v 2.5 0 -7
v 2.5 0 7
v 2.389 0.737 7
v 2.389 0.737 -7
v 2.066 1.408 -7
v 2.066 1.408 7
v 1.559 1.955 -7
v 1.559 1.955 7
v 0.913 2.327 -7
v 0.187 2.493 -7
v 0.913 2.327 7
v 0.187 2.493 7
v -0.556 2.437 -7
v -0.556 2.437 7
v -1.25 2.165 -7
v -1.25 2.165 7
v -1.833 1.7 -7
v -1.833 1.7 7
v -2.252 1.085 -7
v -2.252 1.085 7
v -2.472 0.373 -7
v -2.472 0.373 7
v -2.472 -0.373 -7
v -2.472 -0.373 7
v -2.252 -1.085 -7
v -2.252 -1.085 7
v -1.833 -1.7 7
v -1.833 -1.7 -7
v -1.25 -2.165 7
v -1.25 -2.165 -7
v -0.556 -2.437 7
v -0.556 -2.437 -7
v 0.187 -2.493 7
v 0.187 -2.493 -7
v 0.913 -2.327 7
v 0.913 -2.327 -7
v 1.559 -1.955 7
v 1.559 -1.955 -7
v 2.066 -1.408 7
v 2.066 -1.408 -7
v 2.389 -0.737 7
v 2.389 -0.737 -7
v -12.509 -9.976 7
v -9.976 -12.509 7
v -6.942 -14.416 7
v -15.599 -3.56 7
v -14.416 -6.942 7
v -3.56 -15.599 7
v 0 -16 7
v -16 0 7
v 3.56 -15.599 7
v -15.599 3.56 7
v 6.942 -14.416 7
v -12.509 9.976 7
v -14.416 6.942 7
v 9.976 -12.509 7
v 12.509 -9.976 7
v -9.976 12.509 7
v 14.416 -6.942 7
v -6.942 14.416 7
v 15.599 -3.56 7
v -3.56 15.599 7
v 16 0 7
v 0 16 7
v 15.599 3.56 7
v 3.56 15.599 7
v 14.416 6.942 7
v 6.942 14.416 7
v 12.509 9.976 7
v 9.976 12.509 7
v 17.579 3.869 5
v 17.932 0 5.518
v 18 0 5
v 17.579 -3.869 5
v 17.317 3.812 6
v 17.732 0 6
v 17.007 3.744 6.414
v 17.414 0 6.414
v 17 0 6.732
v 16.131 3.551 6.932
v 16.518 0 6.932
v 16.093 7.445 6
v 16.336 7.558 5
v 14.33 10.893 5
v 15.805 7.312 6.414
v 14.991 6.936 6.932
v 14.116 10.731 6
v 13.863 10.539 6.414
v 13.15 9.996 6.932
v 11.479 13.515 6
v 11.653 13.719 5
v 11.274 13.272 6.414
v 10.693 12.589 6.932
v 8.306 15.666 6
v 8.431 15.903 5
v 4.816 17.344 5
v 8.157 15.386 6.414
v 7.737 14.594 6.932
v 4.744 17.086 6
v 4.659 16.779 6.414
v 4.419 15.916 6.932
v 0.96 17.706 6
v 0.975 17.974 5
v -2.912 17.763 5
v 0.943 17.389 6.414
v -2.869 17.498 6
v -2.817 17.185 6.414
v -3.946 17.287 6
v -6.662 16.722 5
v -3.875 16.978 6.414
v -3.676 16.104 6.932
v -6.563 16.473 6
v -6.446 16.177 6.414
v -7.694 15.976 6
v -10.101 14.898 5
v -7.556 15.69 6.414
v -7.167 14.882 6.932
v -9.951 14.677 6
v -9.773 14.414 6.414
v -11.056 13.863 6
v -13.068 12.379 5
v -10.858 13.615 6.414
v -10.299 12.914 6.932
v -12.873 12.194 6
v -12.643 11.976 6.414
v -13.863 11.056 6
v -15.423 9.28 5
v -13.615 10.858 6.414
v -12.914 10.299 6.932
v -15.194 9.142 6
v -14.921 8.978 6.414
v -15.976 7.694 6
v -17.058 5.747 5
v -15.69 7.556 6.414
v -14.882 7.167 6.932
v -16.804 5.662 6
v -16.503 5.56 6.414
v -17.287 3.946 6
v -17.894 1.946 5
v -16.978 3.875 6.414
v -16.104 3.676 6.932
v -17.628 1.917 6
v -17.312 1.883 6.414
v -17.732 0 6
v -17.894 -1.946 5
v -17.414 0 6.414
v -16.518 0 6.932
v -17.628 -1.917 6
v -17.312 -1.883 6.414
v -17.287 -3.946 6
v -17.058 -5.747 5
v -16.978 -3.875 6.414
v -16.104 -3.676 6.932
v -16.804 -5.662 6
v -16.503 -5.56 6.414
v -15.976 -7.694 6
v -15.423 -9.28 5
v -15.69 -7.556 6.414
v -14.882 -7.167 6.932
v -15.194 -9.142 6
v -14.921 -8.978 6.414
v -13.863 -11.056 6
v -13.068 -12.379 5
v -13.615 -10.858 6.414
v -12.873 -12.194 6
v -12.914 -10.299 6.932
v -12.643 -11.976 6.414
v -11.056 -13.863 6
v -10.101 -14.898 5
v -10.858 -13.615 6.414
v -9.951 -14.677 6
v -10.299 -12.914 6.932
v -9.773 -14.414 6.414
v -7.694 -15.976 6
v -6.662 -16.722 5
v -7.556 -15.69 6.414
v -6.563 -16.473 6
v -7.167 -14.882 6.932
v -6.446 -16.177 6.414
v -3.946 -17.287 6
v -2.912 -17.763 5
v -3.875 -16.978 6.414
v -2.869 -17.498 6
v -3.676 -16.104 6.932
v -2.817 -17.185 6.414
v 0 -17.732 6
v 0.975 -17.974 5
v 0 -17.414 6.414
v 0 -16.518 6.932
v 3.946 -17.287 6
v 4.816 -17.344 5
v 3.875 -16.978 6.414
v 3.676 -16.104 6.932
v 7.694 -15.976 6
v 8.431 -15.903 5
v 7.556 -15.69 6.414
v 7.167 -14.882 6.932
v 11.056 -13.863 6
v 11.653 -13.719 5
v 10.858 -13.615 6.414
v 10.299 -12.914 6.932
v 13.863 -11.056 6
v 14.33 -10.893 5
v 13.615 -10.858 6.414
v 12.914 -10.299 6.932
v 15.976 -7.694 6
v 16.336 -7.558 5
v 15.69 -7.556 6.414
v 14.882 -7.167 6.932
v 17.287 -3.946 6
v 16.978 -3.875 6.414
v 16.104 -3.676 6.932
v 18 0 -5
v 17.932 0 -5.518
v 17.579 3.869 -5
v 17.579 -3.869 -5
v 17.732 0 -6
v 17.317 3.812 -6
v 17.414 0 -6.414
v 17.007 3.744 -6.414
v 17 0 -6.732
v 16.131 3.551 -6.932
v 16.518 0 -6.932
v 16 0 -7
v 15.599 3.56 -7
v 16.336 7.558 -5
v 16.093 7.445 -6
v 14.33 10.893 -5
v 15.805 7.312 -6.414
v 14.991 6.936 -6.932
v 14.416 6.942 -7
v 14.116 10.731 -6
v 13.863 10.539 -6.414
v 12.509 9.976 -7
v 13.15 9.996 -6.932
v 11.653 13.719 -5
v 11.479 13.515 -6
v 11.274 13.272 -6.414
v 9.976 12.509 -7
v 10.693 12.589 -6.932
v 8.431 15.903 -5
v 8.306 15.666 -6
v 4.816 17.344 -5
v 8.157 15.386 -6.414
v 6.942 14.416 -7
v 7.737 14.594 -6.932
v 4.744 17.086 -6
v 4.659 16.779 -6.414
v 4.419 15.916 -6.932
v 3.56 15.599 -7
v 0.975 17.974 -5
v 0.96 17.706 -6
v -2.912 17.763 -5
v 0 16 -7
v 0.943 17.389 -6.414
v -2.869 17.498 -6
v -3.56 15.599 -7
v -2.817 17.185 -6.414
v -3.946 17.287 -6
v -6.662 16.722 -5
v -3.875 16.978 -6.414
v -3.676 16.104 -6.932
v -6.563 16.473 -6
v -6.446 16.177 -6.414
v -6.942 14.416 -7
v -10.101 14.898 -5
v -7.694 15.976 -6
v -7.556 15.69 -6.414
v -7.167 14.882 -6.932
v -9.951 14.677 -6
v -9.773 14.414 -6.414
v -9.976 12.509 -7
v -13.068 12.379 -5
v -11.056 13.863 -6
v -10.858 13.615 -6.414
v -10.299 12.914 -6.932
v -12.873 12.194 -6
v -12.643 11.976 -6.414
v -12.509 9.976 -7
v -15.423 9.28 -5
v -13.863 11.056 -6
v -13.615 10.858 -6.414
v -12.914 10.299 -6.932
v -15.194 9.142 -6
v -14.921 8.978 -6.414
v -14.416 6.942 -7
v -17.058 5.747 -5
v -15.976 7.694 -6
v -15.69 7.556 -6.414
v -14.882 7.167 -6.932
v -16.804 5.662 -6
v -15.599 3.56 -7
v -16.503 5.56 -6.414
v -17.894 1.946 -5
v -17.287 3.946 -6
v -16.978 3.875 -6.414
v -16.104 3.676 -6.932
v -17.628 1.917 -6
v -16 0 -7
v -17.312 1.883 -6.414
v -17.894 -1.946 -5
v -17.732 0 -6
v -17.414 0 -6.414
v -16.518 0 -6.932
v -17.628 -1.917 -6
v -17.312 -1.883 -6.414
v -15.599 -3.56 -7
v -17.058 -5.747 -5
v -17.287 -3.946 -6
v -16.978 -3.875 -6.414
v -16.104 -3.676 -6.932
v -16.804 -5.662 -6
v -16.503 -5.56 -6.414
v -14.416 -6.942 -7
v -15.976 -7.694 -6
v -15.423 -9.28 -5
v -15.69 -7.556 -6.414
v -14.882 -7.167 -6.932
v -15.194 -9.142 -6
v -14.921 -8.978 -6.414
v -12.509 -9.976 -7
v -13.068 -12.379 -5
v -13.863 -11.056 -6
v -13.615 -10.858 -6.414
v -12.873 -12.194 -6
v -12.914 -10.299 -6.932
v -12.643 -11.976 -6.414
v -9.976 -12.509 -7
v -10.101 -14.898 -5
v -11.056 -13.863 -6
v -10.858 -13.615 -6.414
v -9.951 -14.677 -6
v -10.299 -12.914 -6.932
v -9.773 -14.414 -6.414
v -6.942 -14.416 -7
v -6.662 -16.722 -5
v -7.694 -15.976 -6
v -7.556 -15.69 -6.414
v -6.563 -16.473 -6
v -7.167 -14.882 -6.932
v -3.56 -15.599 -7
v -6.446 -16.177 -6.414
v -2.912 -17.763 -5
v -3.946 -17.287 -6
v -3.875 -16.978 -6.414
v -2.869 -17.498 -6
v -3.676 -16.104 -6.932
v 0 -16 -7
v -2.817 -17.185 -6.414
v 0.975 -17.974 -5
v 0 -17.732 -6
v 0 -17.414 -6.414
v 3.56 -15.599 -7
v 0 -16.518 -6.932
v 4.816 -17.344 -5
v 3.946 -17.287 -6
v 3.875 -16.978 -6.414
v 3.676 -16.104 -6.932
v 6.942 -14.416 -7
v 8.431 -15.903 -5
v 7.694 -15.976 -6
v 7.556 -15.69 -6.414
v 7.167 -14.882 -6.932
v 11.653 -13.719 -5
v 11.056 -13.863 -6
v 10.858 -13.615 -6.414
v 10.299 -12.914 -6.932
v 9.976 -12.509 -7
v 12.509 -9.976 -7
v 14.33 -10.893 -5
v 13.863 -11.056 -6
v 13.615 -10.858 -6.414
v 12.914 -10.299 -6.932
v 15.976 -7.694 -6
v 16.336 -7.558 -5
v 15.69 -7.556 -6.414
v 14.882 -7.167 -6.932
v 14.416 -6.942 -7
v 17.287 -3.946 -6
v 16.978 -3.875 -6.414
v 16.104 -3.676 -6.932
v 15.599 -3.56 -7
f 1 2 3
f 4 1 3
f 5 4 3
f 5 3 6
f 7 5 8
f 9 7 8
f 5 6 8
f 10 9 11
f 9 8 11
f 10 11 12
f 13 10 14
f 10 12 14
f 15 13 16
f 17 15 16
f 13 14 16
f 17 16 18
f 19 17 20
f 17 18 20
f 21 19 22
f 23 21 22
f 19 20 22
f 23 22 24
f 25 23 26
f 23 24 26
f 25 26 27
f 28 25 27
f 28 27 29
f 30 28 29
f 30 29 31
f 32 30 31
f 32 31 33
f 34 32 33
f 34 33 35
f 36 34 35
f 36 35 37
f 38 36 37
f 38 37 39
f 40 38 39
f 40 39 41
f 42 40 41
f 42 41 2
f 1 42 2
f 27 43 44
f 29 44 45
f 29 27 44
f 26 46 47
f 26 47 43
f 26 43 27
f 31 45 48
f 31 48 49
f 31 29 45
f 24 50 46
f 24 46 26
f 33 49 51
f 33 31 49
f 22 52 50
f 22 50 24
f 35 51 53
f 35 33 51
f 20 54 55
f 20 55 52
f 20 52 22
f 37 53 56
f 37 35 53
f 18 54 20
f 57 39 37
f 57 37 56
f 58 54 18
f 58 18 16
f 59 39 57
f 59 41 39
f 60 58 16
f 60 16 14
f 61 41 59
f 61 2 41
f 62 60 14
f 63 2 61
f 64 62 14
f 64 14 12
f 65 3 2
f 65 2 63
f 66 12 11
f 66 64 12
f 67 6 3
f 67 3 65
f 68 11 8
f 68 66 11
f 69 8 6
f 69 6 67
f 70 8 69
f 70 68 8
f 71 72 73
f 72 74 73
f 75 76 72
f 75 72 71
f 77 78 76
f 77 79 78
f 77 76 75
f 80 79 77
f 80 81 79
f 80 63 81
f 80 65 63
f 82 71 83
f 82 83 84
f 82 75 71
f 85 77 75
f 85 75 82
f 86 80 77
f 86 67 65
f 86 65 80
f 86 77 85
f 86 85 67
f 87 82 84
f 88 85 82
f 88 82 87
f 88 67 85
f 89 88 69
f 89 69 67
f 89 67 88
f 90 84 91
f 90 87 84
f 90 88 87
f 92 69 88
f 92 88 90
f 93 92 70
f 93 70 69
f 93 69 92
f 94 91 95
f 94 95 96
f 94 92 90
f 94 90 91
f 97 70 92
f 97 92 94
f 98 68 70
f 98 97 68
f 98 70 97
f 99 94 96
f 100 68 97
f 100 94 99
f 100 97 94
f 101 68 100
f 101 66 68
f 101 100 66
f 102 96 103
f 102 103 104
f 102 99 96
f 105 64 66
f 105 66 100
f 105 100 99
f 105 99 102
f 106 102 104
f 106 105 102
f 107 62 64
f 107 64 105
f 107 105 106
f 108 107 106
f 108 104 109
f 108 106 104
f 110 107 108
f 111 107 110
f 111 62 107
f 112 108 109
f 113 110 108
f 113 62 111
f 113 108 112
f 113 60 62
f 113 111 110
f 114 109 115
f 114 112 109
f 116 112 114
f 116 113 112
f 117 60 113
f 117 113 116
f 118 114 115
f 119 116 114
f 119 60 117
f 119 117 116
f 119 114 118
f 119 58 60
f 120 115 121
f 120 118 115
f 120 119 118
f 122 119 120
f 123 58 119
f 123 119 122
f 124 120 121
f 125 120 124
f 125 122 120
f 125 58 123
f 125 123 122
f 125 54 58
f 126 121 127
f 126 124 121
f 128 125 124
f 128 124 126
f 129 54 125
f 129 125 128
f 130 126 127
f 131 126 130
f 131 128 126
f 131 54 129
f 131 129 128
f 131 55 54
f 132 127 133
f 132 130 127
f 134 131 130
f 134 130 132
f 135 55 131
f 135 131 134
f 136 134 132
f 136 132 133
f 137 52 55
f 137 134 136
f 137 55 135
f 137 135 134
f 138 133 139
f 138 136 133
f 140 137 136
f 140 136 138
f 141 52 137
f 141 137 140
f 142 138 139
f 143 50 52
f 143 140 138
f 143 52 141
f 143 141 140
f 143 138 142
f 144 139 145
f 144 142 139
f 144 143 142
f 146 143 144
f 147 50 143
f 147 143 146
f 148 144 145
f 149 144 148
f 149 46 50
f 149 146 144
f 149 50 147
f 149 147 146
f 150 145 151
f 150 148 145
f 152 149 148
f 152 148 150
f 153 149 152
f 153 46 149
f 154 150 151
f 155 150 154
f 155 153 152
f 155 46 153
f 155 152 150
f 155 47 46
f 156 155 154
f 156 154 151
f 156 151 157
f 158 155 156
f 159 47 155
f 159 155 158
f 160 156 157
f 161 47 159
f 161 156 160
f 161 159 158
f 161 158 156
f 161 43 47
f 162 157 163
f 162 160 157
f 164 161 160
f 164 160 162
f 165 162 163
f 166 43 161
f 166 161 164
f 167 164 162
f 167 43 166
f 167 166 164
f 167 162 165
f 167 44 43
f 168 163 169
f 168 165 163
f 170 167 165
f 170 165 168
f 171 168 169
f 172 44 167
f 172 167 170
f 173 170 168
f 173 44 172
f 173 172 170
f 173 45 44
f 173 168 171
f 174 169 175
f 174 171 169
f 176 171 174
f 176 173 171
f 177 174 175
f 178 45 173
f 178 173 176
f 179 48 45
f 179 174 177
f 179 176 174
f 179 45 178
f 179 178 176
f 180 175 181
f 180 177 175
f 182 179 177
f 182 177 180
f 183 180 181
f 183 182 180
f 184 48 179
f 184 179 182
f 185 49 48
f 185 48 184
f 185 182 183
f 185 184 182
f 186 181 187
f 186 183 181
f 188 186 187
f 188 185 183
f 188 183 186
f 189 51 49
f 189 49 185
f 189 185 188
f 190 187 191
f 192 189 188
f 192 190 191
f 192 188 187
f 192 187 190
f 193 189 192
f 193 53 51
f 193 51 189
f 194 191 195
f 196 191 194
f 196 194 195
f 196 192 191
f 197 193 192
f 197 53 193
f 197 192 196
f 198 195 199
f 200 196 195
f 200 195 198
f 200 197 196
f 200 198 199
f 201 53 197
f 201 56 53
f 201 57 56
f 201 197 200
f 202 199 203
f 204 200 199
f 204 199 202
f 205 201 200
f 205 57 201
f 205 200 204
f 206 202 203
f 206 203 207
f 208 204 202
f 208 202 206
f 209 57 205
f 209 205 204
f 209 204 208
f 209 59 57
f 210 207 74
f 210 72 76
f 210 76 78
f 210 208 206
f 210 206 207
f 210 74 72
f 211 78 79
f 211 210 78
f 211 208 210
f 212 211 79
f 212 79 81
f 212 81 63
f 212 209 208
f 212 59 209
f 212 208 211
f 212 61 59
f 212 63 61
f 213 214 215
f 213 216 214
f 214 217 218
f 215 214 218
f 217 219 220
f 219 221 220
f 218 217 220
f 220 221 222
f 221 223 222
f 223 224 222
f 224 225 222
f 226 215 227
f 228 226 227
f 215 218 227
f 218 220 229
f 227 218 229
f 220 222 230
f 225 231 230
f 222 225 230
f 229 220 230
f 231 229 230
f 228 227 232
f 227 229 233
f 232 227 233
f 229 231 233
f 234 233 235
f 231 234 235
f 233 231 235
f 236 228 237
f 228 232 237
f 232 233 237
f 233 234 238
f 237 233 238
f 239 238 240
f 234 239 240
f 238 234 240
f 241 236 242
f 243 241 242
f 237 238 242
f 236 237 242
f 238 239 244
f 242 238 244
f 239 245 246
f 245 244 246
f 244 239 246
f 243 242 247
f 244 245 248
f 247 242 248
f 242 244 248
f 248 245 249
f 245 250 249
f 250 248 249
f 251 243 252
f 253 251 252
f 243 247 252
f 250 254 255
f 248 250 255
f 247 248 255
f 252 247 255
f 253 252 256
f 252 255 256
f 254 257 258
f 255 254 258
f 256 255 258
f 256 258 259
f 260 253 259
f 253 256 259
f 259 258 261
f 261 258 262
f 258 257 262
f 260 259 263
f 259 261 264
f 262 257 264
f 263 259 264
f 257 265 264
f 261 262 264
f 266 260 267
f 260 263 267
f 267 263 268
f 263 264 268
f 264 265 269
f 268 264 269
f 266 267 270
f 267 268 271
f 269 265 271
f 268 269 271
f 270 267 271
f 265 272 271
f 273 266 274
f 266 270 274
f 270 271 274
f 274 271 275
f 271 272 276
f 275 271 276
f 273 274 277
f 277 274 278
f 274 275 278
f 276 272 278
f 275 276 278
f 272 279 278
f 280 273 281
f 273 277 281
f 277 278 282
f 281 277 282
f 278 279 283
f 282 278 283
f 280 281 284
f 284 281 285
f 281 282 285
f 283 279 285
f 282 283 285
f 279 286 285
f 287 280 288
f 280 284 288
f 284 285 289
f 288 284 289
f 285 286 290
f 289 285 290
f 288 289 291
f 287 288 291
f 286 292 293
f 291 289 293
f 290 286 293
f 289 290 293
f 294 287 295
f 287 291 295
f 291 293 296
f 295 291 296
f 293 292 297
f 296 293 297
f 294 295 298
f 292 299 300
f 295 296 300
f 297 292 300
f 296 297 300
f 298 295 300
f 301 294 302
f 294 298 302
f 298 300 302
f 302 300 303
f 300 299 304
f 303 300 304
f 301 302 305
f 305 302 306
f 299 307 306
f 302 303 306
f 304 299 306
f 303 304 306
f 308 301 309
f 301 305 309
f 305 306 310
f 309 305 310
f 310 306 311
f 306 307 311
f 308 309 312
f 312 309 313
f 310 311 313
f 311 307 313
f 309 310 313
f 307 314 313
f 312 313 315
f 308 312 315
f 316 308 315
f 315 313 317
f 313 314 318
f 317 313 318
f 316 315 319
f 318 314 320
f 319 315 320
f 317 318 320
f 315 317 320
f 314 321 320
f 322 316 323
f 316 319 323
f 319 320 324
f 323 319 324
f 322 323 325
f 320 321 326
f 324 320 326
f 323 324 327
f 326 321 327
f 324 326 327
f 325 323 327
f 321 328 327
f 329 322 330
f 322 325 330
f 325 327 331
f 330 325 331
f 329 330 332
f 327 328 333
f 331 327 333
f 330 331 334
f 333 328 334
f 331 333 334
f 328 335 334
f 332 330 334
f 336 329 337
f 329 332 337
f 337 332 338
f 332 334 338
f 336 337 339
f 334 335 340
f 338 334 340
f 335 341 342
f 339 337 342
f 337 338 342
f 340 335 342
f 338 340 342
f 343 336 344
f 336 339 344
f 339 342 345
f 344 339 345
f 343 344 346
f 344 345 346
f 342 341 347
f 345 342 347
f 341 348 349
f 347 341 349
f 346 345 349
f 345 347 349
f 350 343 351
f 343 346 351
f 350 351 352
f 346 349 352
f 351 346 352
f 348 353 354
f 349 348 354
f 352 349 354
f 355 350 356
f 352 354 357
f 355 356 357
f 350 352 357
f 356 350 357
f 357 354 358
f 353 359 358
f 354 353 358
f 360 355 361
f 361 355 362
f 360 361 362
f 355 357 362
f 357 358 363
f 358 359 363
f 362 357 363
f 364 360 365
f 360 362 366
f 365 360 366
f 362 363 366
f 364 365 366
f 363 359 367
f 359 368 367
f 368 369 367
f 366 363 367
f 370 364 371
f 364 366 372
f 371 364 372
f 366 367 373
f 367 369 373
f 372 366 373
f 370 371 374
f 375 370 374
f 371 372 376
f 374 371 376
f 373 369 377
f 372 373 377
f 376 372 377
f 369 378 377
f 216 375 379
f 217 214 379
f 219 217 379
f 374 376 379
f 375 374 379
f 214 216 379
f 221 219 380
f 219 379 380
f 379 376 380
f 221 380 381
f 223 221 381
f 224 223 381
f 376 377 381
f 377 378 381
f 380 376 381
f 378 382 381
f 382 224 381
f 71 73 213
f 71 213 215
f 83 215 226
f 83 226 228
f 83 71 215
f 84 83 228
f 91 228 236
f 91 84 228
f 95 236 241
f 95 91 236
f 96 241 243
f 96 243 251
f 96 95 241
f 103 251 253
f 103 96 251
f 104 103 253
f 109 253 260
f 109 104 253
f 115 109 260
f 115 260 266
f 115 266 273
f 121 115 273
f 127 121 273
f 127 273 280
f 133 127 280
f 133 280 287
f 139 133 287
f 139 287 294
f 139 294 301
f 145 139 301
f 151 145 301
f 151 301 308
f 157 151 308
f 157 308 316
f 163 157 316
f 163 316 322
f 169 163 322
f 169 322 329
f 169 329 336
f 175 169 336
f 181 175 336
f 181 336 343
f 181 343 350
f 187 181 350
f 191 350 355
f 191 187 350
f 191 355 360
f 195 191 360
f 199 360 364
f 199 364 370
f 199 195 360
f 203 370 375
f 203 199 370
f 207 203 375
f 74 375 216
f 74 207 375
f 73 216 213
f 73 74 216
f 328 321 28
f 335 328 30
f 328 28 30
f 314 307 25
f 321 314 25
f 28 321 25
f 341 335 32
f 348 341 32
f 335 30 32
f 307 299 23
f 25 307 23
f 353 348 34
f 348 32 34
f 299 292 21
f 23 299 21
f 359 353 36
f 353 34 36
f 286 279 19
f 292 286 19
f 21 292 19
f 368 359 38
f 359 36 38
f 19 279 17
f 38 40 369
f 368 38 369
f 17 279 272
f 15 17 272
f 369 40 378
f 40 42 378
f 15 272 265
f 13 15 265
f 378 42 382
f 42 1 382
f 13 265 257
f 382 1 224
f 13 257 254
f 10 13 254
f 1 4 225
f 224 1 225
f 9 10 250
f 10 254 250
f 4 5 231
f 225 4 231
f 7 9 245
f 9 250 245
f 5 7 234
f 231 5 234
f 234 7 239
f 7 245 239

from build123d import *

# Parameters (mm, degrees)
SKETCH1_R           = 18
BOSS_EXTRUDE1_DEPTH = 7
FILLET2_R           = 2
CUT_EXTRUDE1_REACH  = 16
SKETCH2_R           = 2.5


with BuildPart() as part:
    # Sketch1 → Boss-Extrude1 (new body)
    with BuildSketch(Plane.XY):
        Circle(SKETCH1_R)
    boss_extrude1 = extrude(amount=BOSS_EXTRUDE1_DEPTH)

    # Mirror1: Boss-Extrude1 across plane
    add(boss_extrude1.mirror(Plane.XY))

    # Fillet2
    fillet2_edges = [part.edges().sort_by_distance(p)[0] for p in [
        (-18, 0, 7),
        (-18, 0, -7),
    ]]
    fillet(fillet2_edges, radius=FILLET2_R)

    # Sketch2 → Cut-Extrude1 (cut, up to next)
    with BuildSketch(Plane.XY.offset(7), mode=Mode.PRIVATE) as cut_extrude1_sk1:
        Circle(SKETCH2_R)
    cut_extrude1_tool1 = extrude(cut_extrude1_sk1.sketch, amount=-CUT_EXTRUDE1_REACH, mode=Mode.PRIVATE) & part.part
    add(cut_extrude1_tool1.solids().sort_by_distance((0, 0, 7))[0], mode=Mode.SUBTRACT)


solid = part.part
